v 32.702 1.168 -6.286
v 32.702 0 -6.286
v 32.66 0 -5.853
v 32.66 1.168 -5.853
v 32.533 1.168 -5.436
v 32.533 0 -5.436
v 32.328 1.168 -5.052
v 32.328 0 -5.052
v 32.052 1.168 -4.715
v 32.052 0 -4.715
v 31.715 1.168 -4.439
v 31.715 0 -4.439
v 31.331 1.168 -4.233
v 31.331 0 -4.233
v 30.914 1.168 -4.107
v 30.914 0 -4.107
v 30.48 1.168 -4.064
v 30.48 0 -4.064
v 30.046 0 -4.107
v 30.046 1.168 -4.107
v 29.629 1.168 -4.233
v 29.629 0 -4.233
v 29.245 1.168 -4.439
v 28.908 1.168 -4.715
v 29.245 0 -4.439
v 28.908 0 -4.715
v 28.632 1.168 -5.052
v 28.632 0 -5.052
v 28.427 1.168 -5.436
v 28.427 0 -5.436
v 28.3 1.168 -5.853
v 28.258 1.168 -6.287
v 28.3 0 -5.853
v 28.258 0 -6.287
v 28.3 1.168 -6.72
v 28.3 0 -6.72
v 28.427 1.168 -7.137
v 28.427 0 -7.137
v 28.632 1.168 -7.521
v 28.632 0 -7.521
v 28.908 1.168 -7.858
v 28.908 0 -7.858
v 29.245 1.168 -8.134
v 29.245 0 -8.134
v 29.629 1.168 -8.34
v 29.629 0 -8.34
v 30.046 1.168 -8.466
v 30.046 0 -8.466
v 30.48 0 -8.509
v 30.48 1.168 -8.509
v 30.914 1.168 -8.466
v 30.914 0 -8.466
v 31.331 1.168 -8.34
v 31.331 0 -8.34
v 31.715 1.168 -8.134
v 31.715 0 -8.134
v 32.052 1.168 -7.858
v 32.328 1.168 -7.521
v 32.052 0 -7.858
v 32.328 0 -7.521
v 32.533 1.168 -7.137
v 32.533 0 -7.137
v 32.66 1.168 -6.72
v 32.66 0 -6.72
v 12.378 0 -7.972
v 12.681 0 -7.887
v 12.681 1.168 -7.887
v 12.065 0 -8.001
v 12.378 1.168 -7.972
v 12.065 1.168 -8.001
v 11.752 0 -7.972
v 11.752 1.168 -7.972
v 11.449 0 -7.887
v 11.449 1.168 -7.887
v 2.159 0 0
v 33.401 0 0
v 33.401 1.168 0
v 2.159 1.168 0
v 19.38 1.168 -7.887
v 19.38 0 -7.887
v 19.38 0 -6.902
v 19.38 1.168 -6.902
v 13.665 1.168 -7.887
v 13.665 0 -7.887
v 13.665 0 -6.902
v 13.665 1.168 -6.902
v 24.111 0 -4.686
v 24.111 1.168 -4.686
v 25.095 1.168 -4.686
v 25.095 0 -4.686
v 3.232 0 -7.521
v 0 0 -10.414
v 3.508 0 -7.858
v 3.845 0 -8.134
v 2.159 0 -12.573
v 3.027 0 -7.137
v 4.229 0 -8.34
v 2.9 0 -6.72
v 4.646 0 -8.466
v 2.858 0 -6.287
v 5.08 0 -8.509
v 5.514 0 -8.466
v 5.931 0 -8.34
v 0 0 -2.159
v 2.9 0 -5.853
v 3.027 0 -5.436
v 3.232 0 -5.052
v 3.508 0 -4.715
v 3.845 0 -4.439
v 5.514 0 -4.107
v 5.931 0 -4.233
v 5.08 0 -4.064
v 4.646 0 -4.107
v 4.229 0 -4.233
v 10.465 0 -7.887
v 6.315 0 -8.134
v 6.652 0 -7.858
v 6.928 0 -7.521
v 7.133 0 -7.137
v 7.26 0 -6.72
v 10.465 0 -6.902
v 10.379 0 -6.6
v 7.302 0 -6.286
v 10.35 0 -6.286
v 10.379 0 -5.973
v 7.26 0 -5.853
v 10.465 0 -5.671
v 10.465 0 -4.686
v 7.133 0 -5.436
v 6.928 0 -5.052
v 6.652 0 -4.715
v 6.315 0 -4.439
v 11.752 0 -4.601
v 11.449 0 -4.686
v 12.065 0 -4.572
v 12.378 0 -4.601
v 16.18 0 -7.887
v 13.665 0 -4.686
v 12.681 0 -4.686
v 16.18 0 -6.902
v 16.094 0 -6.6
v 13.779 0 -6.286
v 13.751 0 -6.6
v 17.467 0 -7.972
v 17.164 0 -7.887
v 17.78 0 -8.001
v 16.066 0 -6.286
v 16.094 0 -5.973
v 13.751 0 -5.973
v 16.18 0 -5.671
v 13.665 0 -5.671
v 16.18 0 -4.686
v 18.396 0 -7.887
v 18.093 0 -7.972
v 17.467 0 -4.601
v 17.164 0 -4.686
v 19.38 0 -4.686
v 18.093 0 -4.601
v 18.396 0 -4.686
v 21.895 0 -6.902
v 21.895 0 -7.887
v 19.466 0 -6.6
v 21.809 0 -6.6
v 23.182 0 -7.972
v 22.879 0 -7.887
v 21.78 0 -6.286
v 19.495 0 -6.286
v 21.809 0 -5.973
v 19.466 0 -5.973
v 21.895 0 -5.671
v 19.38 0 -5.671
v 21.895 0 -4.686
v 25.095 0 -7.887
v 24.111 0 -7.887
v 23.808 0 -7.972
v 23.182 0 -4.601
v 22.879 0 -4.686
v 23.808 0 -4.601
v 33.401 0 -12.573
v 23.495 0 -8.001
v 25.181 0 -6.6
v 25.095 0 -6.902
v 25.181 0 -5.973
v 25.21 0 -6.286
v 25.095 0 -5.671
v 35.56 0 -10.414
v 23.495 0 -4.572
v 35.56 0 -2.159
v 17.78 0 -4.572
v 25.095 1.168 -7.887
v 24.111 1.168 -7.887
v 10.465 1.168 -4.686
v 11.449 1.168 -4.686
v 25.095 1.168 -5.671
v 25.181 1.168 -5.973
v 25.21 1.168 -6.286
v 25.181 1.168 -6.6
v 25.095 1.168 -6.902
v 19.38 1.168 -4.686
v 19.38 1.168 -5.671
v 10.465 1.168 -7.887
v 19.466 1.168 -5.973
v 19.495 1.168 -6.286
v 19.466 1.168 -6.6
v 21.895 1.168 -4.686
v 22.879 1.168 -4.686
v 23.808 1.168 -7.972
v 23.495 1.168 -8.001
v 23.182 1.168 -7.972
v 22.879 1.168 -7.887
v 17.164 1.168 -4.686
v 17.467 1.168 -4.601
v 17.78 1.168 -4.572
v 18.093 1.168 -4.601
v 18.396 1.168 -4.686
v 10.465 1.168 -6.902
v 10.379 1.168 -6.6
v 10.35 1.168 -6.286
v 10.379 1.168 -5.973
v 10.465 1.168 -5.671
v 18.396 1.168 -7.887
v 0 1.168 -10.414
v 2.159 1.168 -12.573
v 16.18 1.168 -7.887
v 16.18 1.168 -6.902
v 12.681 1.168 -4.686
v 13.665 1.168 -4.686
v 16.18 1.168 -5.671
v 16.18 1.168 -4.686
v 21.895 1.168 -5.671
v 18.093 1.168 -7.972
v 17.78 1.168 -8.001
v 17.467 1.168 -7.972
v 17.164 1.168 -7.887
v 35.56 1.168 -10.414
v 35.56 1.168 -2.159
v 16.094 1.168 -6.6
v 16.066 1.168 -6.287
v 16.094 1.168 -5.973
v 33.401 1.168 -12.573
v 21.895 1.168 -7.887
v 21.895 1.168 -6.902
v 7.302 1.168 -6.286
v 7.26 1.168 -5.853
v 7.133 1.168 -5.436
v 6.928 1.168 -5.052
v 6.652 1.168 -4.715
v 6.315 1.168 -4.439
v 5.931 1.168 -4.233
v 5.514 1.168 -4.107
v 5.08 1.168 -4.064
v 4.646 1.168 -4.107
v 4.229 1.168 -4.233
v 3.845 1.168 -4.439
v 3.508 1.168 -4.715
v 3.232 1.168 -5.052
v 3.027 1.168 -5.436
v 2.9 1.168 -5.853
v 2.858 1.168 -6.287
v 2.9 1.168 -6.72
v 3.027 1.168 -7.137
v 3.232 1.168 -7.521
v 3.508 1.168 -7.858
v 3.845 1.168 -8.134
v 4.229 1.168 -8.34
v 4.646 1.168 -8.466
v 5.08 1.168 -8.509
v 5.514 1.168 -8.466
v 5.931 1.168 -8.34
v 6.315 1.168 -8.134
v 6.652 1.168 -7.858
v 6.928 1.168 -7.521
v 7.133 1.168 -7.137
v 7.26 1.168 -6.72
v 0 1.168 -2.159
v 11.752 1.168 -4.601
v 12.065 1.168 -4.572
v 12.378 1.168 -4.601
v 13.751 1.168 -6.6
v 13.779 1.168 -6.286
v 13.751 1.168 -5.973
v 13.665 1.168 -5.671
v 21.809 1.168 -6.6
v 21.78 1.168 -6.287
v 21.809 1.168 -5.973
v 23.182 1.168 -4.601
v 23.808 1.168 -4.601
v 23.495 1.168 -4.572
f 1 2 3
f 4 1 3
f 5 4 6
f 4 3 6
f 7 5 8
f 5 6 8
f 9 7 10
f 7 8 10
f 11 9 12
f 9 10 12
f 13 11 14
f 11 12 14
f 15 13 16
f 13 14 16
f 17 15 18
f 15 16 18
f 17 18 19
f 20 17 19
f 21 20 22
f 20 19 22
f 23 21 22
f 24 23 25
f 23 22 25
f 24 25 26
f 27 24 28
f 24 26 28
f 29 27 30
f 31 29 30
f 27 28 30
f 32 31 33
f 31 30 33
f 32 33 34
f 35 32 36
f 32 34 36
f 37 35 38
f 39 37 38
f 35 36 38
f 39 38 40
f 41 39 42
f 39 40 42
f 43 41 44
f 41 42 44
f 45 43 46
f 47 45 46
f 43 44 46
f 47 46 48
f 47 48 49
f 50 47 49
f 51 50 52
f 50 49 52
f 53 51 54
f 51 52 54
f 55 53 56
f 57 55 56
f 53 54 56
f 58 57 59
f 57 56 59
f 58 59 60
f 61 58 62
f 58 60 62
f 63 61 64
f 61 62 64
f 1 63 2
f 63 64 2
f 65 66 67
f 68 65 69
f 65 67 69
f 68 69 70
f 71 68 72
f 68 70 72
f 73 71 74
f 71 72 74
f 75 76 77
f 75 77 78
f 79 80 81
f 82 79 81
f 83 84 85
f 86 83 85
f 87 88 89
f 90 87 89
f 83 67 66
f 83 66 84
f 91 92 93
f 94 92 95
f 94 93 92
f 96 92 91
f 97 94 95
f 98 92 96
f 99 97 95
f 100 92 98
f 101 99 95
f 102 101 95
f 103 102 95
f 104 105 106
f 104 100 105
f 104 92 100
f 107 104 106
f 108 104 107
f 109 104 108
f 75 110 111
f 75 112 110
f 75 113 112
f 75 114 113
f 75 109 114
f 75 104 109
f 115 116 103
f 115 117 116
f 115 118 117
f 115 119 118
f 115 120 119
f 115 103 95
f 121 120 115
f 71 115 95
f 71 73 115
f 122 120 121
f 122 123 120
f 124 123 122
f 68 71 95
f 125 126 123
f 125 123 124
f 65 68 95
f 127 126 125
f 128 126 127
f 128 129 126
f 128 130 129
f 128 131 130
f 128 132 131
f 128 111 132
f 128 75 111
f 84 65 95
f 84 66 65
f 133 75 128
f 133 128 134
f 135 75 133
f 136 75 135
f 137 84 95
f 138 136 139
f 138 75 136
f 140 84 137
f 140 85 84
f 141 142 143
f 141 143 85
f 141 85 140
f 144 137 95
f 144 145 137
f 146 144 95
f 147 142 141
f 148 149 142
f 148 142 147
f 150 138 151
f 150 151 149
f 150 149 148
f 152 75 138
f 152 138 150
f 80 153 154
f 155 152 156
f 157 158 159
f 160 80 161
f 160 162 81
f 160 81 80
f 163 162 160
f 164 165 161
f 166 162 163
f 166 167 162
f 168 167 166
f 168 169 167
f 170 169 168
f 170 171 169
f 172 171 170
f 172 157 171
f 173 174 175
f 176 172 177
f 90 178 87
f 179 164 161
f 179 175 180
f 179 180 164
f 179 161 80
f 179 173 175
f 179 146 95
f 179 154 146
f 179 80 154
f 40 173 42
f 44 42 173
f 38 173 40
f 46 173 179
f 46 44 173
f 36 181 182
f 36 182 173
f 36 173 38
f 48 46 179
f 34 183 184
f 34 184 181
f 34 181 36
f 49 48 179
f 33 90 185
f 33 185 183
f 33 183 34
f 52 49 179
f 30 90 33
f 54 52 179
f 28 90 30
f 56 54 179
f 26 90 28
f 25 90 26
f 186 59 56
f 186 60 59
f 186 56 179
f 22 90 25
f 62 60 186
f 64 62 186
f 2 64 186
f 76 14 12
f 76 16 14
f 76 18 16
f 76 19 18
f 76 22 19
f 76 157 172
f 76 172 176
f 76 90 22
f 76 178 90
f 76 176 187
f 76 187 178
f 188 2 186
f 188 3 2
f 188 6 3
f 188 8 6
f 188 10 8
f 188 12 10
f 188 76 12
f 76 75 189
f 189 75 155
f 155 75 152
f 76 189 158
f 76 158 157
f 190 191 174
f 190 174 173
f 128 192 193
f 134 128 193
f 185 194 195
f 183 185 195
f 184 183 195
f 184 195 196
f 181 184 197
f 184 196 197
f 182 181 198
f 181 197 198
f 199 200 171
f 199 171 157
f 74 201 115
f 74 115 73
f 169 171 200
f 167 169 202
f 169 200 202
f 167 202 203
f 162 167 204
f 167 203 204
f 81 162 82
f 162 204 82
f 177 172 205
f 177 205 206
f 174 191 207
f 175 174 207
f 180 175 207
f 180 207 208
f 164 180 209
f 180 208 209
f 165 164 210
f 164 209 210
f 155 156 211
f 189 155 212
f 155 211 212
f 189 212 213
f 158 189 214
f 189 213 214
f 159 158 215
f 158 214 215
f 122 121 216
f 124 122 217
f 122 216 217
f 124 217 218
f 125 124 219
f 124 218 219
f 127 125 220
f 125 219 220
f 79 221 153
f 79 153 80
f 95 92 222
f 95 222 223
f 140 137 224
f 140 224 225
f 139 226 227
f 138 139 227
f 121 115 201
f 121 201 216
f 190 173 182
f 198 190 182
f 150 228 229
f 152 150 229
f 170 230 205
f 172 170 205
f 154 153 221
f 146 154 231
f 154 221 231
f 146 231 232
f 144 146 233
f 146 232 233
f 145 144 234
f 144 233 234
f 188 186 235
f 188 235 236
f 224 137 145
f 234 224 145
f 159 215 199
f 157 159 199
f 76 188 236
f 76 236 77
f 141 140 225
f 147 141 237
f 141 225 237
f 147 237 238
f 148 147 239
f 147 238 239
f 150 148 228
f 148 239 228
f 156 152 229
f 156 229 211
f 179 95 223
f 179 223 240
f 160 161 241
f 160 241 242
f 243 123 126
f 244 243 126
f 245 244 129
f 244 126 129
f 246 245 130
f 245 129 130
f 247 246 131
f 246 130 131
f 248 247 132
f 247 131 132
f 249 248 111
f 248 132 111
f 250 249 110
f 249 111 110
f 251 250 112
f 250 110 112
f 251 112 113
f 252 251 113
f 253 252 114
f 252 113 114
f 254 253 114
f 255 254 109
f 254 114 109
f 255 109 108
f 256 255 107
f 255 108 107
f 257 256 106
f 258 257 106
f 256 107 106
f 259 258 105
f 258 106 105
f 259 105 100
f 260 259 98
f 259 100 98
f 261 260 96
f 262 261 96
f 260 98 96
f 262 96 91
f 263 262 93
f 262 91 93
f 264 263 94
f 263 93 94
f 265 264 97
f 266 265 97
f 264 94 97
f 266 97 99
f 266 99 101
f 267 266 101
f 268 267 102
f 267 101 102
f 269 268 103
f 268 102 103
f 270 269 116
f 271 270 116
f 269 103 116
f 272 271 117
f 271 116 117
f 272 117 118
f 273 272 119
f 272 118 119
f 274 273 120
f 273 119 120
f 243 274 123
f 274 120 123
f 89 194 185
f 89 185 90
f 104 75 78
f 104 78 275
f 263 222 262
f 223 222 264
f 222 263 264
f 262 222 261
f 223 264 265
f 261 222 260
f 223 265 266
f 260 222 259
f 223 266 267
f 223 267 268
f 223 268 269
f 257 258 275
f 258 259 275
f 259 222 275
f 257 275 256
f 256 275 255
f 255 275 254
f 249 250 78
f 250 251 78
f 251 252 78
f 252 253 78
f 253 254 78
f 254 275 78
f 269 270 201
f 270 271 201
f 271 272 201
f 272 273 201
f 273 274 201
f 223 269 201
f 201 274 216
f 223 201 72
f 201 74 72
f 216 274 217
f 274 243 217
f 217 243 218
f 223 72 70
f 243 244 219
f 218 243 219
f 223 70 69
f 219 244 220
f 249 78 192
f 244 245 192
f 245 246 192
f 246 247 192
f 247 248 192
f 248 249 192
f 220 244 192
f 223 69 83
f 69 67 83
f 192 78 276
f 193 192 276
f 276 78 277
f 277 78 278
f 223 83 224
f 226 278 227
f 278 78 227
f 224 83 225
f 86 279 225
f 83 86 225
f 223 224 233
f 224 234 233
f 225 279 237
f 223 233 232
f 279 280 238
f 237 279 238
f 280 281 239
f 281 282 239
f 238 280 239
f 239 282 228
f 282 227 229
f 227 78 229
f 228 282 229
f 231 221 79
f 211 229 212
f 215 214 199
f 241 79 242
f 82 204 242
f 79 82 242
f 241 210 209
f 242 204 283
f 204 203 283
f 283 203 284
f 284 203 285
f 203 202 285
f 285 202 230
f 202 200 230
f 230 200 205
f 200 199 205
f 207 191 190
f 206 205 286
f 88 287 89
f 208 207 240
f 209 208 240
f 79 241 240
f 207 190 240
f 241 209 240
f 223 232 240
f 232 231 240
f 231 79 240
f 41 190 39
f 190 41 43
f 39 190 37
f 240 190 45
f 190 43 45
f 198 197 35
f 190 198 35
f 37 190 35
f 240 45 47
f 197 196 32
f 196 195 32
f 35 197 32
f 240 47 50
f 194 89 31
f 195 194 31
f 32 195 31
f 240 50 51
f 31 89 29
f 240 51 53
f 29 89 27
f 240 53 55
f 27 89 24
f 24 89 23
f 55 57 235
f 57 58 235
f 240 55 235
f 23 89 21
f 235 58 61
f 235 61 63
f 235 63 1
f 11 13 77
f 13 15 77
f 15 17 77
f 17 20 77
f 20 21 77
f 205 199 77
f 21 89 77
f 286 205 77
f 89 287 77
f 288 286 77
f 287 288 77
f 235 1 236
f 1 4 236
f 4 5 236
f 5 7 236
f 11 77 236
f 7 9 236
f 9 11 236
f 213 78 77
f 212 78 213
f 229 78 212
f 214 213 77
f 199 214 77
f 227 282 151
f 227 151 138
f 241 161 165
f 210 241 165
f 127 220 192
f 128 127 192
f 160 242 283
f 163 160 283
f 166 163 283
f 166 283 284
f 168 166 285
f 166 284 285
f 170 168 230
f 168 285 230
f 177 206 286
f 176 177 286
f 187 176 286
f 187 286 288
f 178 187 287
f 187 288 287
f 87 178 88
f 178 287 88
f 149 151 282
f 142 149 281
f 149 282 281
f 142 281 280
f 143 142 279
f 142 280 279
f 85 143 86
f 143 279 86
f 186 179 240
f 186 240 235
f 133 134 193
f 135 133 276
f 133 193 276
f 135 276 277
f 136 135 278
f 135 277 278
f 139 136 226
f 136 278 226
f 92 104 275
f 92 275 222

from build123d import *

# Parameters (mm, degrees)
SKETCH1_R           = 2.2225
SKETCH1_W           = 3.2004
SKETCH1_H           = 3.2004
BOSS_EXTRUDE1_DEPTH = 1.1684
SKETCH2_R           = 1.7145
CUT_EXTRUDE1_DEPTH  = 2.54


with BuildPart() as part:
    # Sketch1 → Boss-Extrude1 (new body)
    with BuildSketch(Plane.XZ):
        Polygon((33.401, -12.573), (35.56, -10.414), (35.56, -2.159), (33.401, 0), (2.159, 0), (0, -2.159), (0, -10.414), (2.159, -12.573), align=None)
        with Locations((5.08, -6.2865)):
            Circle(SKETCH1_R, mode=Mode.SUBTRACT)
        with Locations((30.48, -6.2865)):
            Circle(SKETCH1_R, mode=Mode.SUBTRACT)
        with Locations((23.495, -6.2865)):
            Rectangle(SKETCH1_W, SKETCH1_H, mode=Mode.SUBTRACT)
        with Locations((12.065, -6.2865)):
            Rectangle(SKETCH1_W, SKETCH1_H, mode=Mode.SUBTRACT)
        with Locations((17.78, -6.2865)):
            Rectangle(SKETCH1_W, SKETCH1_H, mode=Mode.SUBTRACT)
    extrude(amount=-BOSS_EXTRUDE1_DEPTH)

    # Sketch2 → Cut-Extrude1 (cut)
    with BuildSketch(Plane(origin=(0, 1.1684, 0), x_dir=(1, 0, 0), z_dir=(0, 1, 0))):
        with Locations((12.065, 6.2865)):
            Circle(SKETCH2_R)
        with Locations((17.78, 6.2865)):
            Circle(SKETCH2_R)
        with Locations((23.495, 6.2865)):
            Circle(SKETCH2_R)
    extrude(amount=-CUT_EXTRUDE1_DEPTH, mode=Mode.SUBTRACT)


solid = part.part
